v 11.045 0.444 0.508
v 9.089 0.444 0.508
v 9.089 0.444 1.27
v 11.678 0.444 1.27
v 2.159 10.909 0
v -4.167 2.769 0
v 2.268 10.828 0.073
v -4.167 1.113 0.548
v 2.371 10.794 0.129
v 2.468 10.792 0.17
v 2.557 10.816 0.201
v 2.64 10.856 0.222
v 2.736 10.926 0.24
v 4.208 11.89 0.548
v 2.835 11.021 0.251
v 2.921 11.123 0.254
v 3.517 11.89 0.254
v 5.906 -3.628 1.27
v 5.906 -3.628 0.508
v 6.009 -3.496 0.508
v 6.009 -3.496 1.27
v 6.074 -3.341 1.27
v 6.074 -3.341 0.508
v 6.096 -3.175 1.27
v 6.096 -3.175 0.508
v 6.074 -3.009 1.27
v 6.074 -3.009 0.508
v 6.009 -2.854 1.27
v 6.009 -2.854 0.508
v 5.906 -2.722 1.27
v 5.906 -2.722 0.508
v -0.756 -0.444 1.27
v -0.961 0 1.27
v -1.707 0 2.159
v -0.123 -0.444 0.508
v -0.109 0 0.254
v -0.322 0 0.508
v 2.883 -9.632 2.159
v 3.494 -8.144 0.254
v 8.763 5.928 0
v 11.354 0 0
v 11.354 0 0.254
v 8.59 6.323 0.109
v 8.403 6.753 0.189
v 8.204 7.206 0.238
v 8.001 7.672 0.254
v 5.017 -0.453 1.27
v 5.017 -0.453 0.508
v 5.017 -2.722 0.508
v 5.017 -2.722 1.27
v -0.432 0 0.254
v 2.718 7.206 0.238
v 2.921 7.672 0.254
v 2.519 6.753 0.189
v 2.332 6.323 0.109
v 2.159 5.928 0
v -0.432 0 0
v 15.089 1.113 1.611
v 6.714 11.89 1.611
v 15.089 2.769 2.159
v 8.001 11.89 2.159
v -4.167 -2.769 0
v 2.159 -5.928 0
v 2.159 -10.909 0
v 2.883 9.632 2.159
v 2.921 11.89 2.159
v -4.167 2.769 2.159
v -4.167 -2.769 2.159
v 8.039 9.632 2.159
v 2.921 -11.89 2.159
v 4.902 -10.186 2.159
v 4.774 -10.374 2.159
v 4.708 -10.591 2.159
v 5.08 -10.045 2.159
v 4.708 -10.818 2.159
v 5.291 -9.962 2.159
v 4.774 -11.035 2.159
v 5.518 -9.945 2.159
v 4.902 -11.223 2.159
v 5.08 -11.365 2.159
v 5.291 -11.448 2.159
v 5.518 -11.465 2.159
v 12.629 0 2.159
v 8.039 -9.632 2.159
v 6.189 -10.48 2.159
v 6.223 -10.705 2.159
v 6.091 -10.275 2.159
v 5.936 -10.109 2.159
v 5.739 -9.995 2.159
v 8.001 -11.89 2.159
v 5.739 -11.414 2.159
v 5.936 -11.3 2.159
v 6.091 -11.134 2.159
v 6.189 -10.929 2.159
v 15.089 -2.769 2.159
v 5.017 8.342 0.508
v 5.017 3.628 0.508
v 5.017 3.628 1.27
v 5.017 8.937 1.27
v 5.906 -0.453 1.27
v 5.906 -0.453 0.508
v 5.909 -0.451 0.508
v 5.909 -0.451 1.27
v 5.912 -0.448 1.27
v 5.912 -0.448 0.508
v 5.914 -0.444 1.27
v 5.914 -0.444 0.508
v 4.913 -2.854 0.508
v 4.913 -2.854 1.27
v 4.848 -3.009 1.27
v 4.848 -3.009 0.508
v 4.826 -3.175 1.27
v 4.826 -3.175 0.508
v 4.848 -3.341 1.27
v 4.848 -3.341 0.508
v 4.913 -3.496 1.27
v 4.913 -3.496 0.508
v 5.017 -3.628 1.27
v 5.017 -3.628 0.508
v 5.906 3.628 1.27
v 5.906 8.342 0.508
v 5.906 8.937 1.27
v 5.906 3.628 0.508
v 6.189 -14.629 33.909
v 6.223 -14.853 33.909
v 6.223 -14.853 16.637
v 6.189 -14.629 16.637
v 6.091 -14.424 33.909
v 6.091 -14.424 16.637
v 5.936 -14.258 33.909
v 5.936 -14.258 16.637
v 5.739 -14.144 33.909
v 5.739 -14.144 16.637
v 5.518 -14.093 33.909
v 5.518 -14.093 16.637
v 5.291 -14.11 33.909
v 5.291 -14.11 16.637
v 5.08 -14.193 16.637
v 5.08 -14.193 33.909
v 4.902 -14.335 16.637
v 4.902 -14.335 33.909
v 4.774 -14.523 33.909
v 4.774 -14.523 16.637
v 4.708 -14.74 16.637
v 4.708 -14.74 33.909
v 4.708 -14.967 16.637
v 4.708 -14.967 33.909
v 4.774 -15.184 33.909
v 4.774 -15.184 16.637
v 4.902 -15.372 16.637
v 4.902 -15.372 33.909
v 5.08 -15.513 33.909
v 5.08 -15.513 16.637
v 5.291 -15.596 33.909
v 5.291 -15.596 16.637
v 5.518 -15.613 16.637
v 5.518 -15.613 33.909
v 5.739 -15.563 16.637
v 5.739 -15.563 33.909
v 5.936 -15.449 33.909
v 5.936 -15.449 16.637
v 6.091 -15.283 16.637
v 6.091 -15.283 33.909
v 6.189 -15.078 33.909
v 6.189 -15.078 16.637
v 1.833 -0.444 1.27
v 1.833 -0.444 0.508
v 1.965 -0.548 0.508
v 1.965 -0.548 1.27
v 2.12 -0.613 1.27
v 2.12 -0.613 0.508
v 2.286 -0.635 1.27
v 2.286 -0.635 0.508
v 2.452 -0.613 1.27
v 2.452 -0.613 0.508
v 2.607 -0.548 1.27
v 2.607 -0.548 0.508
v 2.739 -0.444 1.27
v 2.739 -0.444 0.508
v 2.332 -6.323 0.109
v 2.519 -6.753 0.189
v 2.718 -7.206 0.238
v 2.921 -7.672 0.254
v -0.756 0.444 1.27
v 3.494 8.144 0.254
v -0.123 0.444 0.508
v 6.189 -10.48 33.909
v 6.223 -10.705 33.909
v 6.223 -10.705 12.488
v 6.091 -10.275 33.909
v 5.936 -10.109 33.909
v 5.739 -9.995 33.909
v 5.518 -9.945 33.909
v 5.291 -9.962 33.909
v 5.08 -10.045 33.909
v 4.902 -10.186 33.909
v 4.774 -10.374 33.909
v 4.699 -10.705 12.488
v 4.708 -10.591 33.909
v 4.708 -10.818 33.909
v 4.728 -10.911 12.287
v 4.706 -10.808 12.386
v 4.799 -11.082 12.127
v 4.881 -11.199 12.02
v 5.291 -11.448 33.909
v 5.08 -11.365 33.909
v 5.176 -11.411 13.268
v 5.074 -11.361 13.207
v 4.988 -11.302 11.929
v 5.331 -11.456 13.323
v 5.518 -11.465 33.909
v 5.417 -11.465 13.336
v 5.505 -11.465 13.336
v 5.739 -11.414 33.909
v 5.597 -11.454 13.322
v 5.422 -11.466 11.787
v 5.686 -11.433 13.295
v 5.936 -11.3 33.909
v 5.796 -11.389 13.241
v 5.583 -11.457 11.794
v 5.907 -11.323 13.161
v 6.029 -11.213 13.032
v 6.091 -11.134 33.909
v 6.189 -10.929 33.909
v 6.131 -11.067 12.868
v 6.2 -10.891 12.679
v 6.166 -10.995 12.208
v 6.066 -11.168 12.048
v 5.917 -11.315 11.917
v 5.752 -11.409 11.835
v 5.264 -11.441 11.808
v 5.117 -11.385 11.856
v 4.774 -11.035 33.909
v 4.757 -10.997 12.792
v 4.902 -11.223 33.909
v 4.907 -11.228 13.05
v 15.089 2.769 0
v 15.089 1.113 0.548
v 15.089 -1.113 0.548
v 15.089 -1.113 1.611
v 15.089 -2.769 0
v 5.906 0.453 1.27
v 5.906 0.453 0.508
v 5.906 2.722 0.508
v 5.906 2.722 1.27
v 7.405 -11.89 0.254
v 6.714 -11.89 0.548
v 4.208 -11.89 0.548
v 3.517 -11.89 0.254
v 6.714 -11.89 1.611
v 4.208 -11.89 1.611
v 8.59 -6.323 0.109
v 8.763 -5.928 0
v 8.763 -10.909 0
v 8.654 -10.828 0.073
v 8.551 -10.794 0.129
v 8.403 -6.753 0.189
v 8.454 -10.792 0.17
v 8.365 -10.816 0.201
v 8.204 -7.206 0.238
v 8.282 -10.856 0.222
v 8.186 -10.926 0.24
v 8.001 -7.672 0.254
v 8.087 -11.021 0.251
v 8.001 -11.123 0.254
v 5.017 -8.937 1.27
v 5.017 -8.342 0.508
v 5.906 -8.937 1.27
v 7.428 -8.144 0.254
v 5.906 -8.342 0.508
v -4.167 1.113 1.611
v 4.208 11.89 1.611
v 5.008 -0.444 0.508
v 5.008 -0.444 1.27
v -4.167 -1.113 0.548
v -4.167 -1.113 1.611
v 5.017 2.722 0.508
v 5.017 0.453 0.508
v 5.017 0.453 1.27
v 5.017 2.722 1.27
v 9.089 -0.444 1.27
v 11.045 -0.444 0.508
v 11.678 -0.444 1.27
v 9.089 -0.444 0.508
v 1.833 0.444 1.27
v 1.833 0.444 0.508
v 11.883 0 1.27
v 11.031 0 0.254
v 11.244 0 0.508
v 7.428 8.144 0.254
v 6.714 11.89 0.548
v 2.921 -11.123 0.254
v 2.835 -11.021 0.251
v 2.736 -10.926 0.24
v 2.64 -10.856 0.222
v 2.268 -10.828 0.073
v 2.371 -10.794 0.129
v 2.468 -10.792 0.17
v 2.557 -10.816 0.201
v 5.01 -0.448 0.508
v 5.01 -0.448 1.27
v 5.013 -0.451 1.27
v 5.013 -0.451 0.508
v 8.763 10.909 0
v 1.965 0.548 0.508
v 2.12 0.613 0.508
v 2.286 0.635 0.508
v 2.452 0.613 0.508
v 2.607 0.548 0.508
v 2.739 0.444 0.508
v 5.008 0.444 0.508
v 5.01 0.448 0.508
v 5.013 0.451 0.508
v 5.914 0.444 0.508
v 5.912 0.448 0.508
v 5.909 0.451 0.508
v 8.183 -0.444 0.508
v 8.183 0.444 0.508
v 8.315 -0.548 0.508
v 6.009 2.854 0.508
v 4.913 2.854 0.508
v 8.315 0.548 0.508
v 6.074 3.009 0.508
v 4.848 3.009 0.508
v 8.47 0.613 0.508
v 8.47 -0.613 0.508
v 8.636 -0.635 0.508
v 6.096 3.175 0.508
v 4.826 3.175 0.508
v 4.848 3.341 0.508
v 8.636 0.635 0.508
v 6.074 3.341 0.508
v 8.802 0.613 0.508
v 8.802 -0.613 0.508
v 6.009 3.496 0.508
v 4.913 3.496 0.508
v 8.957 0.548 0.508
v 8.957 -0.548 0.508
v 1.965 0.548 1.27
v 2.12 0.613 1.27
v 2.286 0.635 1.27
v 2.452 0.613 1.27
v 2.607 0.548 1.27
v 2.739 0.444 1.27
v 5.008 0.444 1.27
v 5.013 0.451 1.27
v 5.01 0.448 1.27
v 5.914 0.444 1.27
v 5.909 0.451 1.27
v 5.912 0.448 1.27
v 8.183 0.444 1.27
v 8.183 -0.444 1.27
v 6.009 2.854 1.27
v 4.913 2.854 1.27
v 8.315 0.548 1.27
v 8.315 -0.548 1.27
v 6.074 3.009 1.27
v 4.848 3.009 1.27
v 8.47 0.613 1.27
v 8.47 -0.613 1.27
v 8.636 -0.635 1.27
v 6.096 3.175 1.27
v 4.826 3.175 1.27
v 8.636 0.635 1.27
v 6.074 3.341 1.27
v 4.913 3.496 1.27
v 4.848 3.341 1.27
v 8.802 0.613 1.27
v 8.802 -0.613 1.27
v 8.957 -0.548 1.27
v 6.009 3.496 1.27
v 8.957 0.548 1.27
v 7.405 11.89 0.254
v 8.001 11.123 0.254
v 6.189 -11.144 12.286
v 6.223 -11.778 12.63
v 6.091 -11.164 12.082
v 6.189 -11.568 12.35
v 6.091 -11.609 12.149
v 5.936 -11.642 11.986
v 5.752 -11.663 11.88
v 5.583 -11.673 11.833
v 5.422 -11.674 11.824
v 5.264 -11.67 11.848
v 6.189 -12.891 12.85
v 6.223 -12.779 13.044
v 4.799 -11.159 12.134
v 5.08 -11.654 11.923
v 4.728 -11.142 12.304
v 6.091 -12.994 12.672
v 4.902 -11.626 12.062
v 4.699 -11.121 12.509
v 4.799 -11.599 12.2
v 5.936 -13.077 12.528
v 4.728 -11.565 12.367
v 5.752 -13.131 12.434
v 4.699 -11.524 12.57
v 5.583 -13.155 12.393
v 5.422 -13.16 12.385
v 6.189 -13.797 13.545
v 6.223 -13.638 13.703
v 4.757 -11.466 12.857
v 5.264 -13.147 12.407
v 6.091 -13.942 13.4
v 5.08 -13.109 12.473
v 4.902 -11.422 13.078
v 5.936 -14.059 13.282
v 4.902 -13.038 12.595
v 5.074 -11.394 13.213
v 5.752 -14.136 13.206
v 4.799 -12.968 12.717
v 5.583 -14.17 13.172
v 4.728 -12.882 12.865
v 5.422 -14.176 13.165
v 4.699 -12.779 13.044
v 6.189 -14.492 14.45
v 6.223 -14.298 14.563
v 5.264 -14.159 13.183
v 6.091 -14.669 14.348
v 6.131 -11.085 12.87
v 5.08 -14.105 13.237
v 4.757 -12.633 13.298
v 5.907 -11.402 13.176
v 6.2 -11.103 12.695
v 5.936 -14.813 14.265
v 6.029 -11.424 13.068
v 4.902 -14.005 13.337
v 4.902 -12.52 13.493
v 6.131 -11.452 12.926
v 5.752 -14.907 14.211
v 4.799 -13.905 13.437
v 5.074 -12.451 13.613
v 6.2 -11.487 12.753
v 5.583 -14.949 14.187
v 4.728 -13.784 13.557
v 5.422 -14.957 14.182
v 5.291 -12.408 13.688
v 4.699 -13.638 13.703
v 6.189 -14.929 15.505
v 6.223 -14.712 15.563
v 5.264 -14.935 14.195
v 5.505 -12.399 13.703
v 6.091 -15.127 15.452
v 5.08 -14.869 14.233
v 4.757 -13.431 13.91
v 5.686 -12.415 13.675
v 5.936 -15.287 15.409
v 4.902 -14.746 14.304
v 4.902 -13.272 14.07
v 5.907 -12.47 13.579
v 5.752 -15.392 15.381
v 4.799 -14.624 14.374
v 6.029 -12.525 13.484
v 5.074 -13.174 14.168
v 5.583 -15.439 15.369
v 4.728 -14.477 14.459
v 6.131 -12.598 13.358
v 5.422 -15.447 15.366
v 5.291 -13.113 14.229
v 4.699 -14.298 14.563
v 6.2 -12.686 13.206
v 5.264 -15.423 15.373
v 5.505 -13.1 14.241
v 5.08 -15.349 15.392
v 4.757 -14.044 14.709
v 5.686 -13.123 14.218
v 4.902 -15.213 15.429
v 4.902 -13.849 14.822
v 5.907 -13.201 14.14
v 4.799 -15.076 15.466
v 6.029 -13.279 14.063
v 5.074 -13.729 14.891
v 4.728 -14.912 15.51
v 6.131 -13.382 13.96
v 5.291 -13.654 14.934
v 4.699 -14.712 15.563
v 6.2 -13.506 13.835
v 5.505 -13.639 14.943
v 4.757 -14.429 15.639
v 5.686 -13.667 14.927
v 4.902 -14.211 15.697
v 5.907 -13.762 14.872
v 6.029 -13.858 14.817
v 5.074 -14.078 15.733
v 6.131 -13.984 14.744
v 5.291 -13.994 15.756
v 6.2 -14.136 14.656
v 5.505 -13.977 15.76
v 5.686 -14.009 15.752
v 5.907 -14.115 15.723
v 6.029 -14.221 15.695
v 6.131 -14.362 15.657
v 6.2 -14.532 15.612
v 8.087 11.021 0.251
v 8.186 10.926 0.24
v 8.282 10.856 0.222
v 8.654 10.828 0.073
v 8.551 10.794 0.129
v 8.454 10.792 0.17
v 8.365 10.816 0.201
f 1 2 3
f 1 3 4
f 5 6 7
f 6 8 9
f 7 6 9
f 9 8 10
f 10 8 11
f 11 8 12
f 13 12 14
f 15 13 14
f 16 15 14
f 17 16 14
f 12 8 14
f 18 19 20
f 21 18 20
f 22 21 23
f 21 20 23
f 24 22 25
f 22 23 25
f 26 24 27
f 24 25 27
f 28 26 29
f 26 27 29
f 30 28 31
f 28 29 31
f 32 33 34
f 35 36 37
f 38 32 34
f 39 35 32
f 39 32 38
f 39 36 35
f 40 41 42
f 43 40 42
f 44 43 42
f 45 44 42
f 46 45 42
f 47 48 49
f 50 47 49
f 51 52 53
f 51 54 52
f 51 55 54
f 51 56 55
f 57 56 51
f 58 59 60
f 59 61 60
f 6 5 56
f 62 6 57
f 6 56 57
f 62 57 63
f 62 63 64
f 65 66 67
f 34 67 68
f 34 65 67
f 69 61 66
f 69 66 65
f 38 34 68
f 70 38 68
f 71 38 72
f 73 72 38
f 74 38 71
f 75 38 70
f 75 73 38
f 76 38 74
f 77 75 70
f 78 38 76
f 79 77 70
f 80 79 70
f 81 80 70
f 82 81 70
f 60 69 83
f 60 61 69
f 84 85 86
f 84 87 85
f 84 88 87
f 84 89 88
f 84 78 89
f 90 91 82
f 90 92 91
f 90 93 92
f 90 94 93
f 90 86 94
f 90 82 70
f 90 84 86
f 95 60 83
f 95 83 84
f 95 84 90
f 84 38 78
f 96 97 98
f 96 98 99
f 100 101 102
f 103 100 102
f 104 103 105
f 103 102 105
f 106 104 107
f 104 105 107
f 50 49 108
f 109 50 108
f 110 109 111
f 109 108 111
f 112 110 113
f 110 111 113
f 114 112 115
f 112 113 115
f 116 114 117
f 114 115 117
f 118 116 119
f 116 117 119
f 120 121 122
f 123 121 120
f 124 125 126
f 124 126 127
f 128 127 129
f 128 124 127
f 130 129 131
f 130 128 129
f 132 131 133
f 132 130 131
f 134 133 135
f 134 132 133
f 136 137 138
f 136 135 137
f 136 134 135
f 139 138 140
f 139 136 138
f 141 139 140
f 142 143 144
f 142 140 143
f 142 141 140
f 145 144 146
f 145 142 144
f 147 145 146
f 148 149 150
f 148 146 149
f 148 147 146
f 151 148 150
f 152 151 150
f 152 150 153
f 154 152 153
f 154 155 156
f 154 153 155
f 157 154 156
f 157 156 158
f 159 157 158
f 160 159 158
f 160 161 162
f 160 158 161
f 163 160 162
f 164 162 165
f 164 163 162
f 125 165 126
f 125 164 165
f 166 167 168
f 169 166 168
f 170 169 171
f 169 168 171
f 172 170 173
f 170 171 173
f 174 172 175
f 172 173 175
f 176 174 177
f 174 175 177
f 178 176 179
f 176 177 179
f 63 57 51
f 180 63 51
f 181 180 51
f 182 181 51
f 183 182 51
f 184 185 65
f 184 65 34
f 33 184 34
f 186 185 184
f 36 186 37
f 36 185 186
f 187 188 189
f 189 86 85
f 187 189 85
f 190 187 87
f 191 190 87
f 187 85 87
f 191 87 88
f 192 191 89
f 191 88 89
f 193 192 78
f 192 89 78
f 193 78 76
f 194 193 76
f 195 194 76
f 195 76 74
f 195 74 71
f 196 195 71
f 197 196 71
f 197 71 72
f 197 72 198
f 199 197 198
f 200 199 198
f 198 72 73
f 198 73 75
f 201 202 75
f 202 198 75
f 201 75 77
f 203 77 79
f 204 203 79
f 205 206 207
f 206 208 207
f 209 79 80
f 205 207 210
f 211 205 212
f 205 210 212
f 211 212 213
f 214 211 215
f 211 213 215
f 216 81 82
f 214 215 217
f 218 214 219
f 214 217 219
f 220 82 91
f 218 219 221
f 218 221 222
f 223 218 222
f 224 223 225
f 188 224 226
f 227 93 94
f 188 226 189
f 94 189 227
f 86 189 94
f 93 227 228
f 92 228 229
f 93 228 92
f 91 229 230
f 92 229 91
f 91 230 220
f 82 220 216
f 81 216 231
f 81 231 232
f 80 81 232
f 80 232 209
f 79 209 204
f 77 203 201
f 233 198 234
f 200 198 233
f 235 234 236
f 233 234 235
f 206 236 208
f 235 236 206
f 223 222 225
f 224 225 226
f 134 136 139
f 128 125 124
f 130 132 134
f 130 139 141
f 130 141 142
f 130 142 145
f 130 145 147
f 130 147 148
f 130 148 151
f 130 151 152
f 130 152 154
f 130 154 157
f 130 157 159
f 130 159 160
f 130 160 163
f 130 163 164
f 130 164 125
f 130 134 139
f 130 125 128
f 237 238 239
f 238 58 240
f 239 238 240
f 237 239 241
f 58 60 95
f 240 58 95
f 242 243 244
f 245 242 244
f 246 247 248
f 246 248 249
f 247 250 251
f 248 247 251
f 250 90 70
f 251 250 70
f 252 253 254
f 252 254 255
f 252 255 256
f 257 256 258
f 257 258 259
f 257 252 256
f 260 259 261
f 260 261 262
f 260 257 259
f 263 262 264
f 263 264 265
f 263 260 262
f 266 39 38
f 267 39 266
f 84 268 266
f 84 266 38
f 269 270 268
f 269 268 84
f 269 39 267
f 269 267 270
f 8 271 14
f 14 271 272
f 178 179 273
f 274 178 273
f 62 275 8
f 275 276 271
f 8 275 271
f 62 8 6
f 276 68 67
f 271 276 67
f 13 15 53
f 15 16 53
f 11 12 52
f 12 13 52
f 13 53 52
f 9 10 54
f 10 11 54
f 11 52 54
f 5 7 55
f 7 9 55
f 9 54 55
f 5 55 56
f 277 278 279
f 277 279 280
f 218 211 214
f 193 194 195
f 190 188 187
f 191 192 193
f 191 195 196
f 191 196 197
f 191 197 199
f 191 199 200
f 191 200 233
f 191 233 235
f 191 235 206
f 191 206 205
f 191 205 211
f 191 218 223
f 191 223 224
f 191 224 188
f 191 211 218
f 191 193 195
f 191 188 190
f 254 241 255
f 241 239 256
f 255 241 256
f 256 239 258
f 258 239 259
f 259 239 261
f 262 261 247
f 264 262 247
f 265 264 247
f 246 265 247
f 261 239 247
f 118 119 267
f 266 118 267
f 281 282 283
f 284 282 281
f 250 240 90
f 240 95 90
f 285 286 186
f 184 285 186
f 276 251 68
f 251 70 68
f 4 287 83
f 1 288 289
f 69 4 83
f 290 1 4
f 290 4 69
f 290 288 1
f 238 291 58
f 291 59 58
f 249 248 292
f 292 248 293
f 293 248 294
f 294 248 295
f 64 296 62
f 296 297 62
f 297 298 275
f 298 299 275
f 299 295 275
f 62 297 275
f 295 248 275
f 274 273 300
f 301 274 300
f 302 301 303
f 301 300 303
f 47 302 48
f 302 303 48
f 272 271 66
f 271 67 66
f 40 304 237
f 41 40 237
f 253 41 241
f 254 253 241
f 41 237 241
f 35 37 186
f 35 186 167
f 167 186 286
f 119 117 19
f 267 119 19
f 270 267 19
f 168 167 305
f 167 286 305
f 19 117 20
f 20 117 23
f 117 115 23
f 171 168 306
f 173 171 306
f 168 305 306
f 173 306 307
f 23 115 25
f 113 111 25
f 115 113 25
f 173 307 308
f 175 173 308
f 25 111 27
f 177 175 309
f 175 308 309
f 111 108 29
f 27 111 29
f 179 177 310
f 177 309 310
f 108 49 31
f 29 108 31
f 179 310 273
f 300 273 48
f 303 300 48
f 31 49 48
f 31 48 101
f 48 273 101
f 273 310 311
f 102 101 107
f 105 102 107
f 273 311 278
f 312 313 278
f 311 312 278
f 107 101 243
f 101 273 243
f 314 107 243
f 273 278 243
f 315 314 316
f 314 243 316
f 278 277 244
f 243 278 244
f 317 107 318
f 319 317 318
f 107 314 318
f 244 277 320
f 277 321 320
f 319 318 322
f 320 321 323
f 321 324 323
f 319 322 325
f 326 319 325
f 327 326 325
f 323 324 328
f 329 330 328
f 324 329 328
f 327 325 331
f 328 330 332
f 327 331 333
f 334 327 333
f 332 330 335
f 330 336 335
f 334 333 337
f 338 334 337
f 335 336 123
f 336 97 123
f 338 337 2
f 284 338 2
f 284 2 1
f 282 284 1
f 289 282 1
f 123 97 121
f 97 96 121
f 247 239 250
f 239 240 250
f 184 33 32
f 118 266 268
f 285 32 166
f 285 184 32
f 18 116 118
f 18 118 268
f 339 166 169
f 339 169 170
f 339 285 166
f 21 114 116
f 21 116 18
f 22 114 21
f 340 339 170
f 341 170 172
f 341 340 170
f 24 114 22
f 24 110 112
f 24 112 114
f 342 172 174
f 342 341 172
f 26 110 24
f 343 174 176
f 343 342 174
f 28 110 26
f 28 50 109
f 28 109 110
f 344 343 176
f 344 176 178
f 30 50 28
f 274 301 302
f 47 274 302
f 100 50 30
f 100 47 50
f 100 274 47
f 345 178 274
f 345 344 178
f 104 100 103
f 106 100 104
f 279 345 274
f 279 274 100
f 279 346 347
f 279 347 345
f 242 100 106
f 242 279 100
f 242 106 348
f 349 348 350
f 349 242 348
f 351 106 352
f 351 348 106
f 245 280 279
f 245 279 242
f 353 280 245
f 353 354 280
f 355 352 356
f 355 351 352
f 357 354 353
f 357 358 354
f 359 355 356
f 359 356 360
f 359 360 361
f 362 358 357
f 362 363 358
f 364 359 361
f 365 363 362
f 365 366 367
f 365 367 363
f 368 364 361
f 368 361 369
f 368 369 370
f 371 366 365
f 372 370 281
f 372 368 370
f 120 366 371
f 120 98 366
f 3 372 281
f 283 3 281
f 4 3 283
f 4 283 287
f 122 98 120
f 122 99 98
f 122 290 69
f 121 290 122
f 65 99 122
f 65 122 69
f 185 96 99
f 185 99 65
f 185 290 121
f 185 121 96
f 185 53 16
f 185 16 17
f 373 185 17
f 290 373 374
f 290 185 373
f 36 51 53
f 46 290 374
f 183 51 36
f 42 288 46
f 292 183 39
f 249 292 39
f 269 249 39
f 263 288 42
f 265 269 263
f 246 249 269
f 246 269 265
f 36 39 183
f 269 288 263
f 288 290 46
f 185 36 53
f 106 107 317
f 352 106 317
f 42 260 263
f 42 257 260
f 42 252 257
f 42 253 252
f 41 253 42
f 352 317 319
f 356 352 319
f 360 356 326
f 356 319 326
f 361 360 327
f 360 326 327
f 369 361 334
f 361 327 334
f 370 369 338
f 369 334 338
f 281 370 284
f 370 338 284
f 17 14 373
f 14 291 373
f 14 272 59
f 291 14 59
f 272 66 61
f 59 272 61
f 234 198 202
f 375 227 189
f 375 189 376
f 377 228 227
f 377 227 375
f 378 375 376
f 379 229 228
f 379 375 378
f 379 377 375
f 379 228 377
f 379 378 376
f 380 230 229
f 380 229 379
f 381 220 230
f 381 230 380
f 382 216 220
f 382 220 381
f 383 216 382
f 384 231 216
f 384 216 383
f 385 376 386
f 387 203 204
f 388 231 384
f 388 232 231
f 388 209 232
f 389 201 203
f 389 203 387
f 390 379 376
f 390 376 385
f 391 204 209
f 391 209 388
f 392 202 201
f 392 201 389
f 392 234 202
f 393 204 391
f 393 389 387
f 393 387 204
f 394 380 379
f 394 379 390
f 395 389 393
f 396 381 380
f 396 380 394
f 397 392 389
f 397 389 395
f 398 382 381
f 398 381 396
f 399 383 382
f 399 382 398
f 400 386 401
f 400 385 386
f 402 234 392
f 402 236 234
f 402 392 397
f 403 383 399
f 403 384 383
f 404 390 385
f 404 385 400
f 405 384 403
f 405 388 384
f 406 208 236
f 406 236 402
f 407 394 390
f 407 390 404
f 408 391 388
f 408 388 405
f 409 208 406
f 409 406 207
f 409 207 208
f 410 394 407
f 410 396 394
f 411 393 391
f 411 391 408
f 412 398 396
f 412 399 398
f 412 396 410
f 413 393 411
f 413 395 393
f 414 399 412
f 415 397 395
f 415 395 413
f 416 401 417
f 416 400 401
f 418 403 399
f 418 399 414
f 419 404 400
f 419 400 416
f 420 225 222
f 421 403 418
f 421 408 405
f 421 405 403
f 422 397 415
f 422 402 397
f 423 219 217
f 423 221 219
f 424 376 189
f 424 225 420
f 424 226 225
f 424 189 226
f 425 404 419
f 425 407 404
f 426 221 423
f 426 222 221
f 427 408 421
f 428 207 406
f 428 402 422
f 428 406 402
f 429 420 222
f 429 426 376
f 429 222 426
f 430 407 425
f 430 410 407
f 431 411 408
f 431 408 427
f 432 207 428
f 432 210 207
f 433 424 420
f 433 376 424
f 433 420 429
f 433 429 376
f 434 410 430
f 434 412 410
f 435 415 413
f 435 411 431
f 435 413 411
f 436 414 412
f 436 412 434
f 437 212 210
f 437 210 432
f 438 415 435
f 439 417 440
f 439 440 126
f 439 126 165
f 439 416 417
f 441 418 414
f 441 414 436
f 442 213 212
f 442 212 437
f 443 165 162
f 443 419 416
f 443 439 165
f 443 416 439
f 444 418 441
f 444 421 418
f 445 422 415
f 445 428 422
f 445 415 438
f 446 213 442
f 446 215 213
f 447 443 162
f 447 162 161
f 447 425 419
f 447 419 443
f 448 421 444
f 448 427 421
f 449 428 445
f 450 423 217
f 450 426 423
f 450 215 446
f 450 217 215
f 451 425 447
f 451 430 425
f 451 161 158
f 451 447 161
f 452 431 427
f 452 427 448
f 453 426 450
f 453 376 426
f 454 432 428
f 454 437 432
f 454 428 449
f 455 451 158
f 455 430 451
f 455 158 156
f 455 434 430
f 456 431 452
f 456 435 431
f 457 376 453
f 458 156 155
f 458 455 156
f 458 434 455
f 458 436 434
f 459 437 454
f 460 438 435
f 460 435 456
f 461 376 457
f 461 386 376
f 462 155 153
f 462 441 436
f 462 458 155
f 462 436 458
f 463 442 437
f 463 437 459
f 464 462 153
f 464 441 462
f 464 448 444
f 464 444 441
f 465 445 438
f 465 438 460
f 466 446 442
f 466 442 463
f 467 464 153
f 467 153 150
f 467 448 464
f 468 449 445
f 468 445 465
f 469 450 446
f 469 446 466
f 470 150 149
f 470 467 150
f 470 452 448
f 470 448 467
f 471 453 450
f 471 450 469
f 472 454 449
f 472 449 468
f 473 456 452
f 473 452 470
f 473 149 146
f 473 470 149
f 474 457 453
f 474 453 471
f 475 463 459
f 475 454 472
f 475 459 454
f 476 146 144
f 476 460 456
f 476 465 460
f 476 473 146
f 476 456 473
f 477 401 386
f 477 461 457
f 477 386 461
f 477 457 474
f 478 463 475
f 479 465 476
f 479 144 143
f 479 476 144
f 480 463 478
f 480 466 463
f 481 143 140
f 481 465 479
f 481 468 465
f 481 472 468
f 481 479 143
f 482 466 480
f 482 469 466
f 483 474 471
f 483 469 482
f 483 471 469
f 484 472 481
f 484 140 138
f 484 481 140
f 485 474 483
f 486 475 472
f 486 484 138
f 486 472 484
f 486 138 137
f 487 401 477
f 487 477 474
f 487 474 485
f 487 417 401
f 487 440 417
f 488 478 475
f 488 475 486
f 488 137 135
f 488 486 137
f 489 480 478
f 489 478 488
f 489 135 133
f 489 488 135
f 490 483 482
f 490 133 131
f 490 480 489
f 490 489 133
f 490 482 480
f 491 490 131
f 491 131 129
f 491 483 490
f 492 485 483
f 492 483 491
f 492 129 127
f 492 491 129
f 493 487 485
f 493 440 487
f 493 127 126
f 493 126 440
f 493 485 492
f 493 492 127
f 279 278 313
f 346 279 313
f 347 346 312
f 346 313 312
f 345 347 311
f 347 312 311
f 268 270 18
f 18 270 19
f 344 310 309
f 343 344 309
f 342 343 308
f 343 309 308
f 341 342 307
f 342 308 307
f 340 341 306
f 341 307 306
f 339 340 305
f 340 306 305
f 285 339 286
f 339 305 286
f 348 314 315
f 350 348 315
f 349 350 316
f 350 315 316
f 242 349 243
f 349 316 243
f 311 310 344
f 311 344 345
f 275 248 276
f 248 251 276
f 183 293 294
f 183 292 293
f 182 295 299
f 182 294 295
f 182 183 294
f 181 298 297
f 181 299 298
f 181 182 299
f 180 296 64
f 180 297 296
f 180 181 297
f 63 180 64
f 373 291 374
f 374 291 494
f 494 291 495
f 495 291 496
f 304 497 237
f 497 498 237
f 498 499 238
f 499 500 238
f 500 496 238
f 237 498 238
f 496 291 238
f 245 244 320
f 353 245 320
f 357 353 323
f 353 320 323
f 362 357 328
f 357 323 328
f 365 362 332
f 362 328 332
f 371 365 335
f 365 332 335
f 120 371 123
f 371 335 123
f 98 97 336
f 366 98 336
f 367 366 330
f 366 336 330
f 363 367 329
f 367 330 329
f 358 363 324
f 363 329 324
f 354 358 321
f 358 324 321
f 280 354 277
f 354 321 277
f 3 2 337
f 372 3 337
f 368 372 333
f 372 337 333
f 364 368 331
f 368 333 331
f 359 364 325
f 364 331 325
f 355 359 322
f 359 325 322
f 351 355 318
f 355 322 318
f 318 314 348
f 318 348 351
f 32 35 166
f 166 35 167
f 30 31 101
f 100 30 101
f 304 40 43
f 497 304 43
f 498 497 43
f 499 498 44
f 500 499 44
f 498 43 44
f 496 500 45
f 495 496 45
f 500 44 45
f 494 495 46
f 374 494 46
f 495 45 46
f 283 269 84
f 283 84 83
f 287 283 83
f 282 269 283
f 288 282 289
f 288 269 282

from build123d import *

# Parameters (mm, degrees)
POCKET_DEPTH         = 0.254
POCKET002_DEPTH      = 11.891
POCKET002_DEPTH_BACK = 11.891
PAD_DEPTH            = 0.762
SKETCH025_R          = 0.762
PAD001_DEPTH         = 31.75
SKETCH040_R          = 0.762


with BuildPart() as part:
    # Sketch → AdditiveLoft section 0
    with BuildSketch(Plane.XY):
        Polygon((-2.54, 11.89), (2.54, 11.89), (9.628041, 2.7686), (9.628041, -2.7686), (2.54, -11.89), (-2.54, -11.89), (-9.628041, -2.7686), (-9.628041, 2.7686), align=None)
    # Sketch028 → AdditiveLoft section 1
    with BuildSketch(Plane.XY.offset(0.548386)):
        Polygon((-9.628041, 1.112788), (-1.253305, 11.89), (1.253305, 11.89), (9.628041, 1.112788), (9.628041, -1.112788), (1.253305, -11.89), (-1.253305, -11.89), (-9.628041, -1.112788), align=None)
    # Sketch029 → AdditiveLoft section 2
    with BuildSketch(Plane.XY.offset(1.610614)):
        Polygon((-9.628041, 1.112788), (-1.253305, 11.89), (1.253305, 11.89), (9.628041, 1.112788), (9.628041, -1.112788), (1.253305, -11.89), (-1.253305, -11.89), (-9.628041, -1.112788), align=None)
    # Sketch019 → AdditiveLoft section 3
    with BuildSketch(Plane.XY.offset(2.159)):
        Polygon((-2.54, 11.89), (2.54, 11.89), (9.628041, 2.7686), (9.628041, -2.7686), (2.54, -11.89), (-2.54, -11.89), (-9.628041, -2.7686), (-9.628041, 2.7686), align=None)
    loft(ruled=True)

    # Sketch013 → SubtractiveLoft section 0
    with BuildSketch(Plane.XY.offset(2.159)):
        Polygon((-7.16788, 0), (-2.577952, -9.63194), (2.577952, -9.63194), (7.16788, 0), (2.577952, 9.63194), (-2.577952, 9.63194), align=None)
    # Sketch014 → SubtractiveLoft section 1
    with BuildSketch(Plane(origin=(0, 0, 0), x_dir=(1, 0, 0), z_dir=(0, 0, -1))):
        Polygon((-5.35686, 0), (-1.88501, 7.94538), (1.88501, 7.94538), (5.35686, 0), (1.88501, -7.94538), (-1.88501, -7.94538), align=None)
    loft(mode=Mode.SUBTRACT)

    # Sketch006 (on Face1 of SubtractiveLoft) → Pocket (cut)
    with BuildSketch(Plane(origin=(0, 0, 0), x_dir=(1, 0, 0), z_dir=(0, 0, -1))):
        Polygon((-5.8928, 0), (-2.073148, 8.739918), (2.073148, 8.739918), (5.8928, 0), (2.073148, -8.739918), (-2.073148, -8.739918), align=None)
    extrude(amount=-POCKET_DEPTH, mode=Mode.SUBTRACT)

    # Sketch022 → Pocket002 (cut, two sides)
    with BuildSketch(Plane.XZ) as pocket002_sk:
        with BuildLine():
            ThreePointArc((-2.54, 0.254), (-2.941609, 0.188828), (-3.302, 0))
            Line((-3.302, 0), (3.302, 0))
            ThreePointArc((3.302, 0), (2.941609, 0.188828), (2.54, 0.254))
            Line((-2.54, 0.254), (2.54, 0.254))
        make_face()
    extrude(amount=-POCKET002_DEPTH, mode=Mode.SUBTRACT)
    extrude(pocket002_sk.sketch, amount=POCKET002_DEPTH_BACK, mode=Mode.SUBTRACT)

    # Sketch018 → Pad (join)
    with BuildSketch(Plane.XY.offset(0.508)):
        with BuildLine():
            Line((-3.628481, 0.4445), (-7.62, 0.4445))
            Line((-7.62, 0.4445), (-7.62, -0.4445))
            Line((-7.62, -0.4445), (-3.628481, -0.4445))
            ThreePointArc((-3.628481, -0.4445), (-3.175, -0.635), (-2.721519, -0.4445))
            Line((-2.721519, -0.4445), (-0.453481, -0.4445))
            ThreePointArc((-0.453481, -0.4445), (-0.449013, -0.449013), (-0.4445, -0.453481))
            Line((-0.4445, -0.453481), (-0.4445, -2.721519))
            ThreePointArc((-0.4445, -2.721519), (-0.635, -3.175), (-0.4445, -3.628481))
            Line((-0.4445, -3.628481), (-0.4445, -10.62))
            Line((-0.4445, -10.62), (0.4445, -10.62))
            Line((0.4445, -10.62), (0.4445, -3.628481))
            ThreePointArc((0.4445, -3.628481), (0.635, -3.175), (0.4445, -2.721519))
            Line((0.4445, -2.721519), (0.4445, -0.453481))
            ThreePointArc((0.4445, -0.453481), (0.449013, -0.449013), (0.453481, -0.4445))
            Line((0.453481, -0.4445), (2.721519, -0.4445))
            ThreePointArc((2.721519, -0.4445), (3.175, -0.635), (3.628481, -0.4445))
            Line((7.62, -0.4445), (3.628481, -0.4445))
            Line((7.62, 0.4445), (7.62, -0.4445))
            Line((3.628481, 0.4445), (7.62, 0.4445))
            ThreePointArc((3.628481, 0.4445), (3.175, 0.635), (2.721519, 0.4445))
            Line((0.453481, 0.4445), (2.721519, 0.4445))
            ThreePointArc((0.453481, 0.4445), (0.449013, 0.449013), (0.4445, 0.453481))
            Line((0.4445, 0.453481), (0.4445, 2.721519))
            ThreePointArc((0.4445, 2.721519), (0.635, 3.175), (0.4445, 3.628481))
            Line((0.4445, 9.35), (0.4445, 3.628481))
            Line((-0.4445, 9.35), (0.4445, 9.35))
            Line((-0.4445, 3.628481), (-0.4445, 9.35))
            ThreePointArc((-0.4445, 3.628481), (-0.635, 3.175), (-0.4445, 2.721519))
            Line((-0.4445, 0.453481), (-0.4445, 2.721519))
            ThreePointArc((-0.4445, 0.453481), (-0.449013, 0.449013), (-0.453481, 0.4445))
            Line((-2.721519, 0.4445), (-0.453481, 0.4445))
            ThreePointArc((-2.721519, 0.4445), (-3.175, 0.635), (-3.628481, 0.4445))
        make_face()
    extrude(amount=PAD_DEPTH)

    # Sketch025 → Pad001 (join)
    with BuildSketch(Plane.XY.offset(2.159)):
        with Locations((0, -10.704667)):
            Circle(SKETCH025_R)
    extrude(amount=PAD001_DEPTH)

    # AdditivePipe: sweep along a path in Sketch037
    with BuildLine(Plane.YZ) as additivepipe_path:
        ThreePointArc((-10.704667, 12.488333), (-13.638217, 13.70345), (-14.853333, 16.637))
        Line((-14.853333, 16.637), (-14.853333, 33.909))
    # Sketch040 → AdditivePipe (sweep)
    with BuildSketch(Plane.XY.offset(33.909)):
        with Locations((0, -14.853333)):
            Circle(SKETCH040_R)
    sweep(path=additivepipe_path.line)


with BuildPart() as part_1:
    # Body placement: moved
    add(part.part.moved(Location((5.461, 0, 0))))


solid = part_1.part
